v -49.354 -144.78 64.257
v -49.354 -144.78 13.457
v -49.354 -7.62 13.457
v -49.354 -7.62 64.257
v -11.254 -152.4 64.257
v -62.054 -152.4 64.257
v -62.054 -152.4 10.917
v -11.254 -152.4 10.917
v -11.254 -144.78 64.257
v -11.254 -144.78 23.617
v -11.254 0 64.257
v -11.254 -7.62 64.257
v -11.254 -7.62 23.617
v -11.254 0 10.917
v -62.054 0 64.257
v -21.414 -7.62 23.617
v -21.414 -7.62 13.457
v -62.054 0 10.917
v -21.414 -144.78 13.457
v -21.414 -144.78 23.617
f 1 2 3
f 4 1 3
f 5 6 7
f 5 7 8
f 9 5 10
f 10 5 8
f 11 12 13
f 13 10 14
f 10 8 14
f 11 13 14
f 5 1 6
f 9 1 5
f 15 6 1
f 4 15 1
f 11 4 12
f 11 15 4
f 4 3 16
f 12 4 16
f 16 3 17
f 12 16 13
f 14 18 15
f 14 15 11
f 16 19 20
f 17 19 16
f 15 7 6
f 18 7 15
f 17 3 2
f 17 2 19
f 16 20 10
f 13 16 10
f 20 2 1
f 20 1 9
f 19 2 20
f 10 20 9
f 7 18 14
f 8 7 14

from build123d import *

# Parameters (mm, degrees)
F0_W     = 50.8
F0_H     = 2.54
F1_DEPTH = 152.4
F2_W     = 12.7
F2_H     = 152.4
F3_DEPTH = 50.8
F4_W     = 38.1
F4_H     = 7.62
F5_DEPTH = 50.8
F6_DEPTH = 50.8
F7_W     = 10.16
F7_H     = 137.16
F8_DEPTH = 10.16


with BuildPart() as f1:
    # F0 (on Front) → F1 (new body)
    with BuildSketch(Plane.XZ):
        with Locations((-36.653862, 12.186867)):
            Rectangle(F0_W, F0_H)
    extrude(amount=F1_DEPTH)

    # F2 (on face) → F3 (join)
    with BuildSketch(Plane.XY.offset(13.456867)):
        with Locations((-55.703862, -76.2)):
            Rectangle(F2_W, F2_H)
    extrude(amount=F3_DEPTH)

    # F4 (on face) → F5 (join)
    with BuildSketch(Plane.XY.offset(13.456867)):
        with Locations((-30.303862, -148.59)):
            Rectangle(F4_W, F4_H)
    extrude(amount=F5_DEPTH)

    # F4 (on face) → F6 (join)
    with BuildSketch(Plane.XY.offset(13.456867)):
        with Locations((-30.303862, -3.81)):
            Rectangle(F4_W, F4_H)
    extrude(amount=F6_DEPTH)

    # F7 (on face) → F8 (join)
    with BuildSketch(Plane.XY.offset(13.456867)):
        with Locations((-16.333862, -76.2)):
            Rectangle(F7_W, F7_H)
    extrude(amount=F8_DEPTH)


solid = f1.part
